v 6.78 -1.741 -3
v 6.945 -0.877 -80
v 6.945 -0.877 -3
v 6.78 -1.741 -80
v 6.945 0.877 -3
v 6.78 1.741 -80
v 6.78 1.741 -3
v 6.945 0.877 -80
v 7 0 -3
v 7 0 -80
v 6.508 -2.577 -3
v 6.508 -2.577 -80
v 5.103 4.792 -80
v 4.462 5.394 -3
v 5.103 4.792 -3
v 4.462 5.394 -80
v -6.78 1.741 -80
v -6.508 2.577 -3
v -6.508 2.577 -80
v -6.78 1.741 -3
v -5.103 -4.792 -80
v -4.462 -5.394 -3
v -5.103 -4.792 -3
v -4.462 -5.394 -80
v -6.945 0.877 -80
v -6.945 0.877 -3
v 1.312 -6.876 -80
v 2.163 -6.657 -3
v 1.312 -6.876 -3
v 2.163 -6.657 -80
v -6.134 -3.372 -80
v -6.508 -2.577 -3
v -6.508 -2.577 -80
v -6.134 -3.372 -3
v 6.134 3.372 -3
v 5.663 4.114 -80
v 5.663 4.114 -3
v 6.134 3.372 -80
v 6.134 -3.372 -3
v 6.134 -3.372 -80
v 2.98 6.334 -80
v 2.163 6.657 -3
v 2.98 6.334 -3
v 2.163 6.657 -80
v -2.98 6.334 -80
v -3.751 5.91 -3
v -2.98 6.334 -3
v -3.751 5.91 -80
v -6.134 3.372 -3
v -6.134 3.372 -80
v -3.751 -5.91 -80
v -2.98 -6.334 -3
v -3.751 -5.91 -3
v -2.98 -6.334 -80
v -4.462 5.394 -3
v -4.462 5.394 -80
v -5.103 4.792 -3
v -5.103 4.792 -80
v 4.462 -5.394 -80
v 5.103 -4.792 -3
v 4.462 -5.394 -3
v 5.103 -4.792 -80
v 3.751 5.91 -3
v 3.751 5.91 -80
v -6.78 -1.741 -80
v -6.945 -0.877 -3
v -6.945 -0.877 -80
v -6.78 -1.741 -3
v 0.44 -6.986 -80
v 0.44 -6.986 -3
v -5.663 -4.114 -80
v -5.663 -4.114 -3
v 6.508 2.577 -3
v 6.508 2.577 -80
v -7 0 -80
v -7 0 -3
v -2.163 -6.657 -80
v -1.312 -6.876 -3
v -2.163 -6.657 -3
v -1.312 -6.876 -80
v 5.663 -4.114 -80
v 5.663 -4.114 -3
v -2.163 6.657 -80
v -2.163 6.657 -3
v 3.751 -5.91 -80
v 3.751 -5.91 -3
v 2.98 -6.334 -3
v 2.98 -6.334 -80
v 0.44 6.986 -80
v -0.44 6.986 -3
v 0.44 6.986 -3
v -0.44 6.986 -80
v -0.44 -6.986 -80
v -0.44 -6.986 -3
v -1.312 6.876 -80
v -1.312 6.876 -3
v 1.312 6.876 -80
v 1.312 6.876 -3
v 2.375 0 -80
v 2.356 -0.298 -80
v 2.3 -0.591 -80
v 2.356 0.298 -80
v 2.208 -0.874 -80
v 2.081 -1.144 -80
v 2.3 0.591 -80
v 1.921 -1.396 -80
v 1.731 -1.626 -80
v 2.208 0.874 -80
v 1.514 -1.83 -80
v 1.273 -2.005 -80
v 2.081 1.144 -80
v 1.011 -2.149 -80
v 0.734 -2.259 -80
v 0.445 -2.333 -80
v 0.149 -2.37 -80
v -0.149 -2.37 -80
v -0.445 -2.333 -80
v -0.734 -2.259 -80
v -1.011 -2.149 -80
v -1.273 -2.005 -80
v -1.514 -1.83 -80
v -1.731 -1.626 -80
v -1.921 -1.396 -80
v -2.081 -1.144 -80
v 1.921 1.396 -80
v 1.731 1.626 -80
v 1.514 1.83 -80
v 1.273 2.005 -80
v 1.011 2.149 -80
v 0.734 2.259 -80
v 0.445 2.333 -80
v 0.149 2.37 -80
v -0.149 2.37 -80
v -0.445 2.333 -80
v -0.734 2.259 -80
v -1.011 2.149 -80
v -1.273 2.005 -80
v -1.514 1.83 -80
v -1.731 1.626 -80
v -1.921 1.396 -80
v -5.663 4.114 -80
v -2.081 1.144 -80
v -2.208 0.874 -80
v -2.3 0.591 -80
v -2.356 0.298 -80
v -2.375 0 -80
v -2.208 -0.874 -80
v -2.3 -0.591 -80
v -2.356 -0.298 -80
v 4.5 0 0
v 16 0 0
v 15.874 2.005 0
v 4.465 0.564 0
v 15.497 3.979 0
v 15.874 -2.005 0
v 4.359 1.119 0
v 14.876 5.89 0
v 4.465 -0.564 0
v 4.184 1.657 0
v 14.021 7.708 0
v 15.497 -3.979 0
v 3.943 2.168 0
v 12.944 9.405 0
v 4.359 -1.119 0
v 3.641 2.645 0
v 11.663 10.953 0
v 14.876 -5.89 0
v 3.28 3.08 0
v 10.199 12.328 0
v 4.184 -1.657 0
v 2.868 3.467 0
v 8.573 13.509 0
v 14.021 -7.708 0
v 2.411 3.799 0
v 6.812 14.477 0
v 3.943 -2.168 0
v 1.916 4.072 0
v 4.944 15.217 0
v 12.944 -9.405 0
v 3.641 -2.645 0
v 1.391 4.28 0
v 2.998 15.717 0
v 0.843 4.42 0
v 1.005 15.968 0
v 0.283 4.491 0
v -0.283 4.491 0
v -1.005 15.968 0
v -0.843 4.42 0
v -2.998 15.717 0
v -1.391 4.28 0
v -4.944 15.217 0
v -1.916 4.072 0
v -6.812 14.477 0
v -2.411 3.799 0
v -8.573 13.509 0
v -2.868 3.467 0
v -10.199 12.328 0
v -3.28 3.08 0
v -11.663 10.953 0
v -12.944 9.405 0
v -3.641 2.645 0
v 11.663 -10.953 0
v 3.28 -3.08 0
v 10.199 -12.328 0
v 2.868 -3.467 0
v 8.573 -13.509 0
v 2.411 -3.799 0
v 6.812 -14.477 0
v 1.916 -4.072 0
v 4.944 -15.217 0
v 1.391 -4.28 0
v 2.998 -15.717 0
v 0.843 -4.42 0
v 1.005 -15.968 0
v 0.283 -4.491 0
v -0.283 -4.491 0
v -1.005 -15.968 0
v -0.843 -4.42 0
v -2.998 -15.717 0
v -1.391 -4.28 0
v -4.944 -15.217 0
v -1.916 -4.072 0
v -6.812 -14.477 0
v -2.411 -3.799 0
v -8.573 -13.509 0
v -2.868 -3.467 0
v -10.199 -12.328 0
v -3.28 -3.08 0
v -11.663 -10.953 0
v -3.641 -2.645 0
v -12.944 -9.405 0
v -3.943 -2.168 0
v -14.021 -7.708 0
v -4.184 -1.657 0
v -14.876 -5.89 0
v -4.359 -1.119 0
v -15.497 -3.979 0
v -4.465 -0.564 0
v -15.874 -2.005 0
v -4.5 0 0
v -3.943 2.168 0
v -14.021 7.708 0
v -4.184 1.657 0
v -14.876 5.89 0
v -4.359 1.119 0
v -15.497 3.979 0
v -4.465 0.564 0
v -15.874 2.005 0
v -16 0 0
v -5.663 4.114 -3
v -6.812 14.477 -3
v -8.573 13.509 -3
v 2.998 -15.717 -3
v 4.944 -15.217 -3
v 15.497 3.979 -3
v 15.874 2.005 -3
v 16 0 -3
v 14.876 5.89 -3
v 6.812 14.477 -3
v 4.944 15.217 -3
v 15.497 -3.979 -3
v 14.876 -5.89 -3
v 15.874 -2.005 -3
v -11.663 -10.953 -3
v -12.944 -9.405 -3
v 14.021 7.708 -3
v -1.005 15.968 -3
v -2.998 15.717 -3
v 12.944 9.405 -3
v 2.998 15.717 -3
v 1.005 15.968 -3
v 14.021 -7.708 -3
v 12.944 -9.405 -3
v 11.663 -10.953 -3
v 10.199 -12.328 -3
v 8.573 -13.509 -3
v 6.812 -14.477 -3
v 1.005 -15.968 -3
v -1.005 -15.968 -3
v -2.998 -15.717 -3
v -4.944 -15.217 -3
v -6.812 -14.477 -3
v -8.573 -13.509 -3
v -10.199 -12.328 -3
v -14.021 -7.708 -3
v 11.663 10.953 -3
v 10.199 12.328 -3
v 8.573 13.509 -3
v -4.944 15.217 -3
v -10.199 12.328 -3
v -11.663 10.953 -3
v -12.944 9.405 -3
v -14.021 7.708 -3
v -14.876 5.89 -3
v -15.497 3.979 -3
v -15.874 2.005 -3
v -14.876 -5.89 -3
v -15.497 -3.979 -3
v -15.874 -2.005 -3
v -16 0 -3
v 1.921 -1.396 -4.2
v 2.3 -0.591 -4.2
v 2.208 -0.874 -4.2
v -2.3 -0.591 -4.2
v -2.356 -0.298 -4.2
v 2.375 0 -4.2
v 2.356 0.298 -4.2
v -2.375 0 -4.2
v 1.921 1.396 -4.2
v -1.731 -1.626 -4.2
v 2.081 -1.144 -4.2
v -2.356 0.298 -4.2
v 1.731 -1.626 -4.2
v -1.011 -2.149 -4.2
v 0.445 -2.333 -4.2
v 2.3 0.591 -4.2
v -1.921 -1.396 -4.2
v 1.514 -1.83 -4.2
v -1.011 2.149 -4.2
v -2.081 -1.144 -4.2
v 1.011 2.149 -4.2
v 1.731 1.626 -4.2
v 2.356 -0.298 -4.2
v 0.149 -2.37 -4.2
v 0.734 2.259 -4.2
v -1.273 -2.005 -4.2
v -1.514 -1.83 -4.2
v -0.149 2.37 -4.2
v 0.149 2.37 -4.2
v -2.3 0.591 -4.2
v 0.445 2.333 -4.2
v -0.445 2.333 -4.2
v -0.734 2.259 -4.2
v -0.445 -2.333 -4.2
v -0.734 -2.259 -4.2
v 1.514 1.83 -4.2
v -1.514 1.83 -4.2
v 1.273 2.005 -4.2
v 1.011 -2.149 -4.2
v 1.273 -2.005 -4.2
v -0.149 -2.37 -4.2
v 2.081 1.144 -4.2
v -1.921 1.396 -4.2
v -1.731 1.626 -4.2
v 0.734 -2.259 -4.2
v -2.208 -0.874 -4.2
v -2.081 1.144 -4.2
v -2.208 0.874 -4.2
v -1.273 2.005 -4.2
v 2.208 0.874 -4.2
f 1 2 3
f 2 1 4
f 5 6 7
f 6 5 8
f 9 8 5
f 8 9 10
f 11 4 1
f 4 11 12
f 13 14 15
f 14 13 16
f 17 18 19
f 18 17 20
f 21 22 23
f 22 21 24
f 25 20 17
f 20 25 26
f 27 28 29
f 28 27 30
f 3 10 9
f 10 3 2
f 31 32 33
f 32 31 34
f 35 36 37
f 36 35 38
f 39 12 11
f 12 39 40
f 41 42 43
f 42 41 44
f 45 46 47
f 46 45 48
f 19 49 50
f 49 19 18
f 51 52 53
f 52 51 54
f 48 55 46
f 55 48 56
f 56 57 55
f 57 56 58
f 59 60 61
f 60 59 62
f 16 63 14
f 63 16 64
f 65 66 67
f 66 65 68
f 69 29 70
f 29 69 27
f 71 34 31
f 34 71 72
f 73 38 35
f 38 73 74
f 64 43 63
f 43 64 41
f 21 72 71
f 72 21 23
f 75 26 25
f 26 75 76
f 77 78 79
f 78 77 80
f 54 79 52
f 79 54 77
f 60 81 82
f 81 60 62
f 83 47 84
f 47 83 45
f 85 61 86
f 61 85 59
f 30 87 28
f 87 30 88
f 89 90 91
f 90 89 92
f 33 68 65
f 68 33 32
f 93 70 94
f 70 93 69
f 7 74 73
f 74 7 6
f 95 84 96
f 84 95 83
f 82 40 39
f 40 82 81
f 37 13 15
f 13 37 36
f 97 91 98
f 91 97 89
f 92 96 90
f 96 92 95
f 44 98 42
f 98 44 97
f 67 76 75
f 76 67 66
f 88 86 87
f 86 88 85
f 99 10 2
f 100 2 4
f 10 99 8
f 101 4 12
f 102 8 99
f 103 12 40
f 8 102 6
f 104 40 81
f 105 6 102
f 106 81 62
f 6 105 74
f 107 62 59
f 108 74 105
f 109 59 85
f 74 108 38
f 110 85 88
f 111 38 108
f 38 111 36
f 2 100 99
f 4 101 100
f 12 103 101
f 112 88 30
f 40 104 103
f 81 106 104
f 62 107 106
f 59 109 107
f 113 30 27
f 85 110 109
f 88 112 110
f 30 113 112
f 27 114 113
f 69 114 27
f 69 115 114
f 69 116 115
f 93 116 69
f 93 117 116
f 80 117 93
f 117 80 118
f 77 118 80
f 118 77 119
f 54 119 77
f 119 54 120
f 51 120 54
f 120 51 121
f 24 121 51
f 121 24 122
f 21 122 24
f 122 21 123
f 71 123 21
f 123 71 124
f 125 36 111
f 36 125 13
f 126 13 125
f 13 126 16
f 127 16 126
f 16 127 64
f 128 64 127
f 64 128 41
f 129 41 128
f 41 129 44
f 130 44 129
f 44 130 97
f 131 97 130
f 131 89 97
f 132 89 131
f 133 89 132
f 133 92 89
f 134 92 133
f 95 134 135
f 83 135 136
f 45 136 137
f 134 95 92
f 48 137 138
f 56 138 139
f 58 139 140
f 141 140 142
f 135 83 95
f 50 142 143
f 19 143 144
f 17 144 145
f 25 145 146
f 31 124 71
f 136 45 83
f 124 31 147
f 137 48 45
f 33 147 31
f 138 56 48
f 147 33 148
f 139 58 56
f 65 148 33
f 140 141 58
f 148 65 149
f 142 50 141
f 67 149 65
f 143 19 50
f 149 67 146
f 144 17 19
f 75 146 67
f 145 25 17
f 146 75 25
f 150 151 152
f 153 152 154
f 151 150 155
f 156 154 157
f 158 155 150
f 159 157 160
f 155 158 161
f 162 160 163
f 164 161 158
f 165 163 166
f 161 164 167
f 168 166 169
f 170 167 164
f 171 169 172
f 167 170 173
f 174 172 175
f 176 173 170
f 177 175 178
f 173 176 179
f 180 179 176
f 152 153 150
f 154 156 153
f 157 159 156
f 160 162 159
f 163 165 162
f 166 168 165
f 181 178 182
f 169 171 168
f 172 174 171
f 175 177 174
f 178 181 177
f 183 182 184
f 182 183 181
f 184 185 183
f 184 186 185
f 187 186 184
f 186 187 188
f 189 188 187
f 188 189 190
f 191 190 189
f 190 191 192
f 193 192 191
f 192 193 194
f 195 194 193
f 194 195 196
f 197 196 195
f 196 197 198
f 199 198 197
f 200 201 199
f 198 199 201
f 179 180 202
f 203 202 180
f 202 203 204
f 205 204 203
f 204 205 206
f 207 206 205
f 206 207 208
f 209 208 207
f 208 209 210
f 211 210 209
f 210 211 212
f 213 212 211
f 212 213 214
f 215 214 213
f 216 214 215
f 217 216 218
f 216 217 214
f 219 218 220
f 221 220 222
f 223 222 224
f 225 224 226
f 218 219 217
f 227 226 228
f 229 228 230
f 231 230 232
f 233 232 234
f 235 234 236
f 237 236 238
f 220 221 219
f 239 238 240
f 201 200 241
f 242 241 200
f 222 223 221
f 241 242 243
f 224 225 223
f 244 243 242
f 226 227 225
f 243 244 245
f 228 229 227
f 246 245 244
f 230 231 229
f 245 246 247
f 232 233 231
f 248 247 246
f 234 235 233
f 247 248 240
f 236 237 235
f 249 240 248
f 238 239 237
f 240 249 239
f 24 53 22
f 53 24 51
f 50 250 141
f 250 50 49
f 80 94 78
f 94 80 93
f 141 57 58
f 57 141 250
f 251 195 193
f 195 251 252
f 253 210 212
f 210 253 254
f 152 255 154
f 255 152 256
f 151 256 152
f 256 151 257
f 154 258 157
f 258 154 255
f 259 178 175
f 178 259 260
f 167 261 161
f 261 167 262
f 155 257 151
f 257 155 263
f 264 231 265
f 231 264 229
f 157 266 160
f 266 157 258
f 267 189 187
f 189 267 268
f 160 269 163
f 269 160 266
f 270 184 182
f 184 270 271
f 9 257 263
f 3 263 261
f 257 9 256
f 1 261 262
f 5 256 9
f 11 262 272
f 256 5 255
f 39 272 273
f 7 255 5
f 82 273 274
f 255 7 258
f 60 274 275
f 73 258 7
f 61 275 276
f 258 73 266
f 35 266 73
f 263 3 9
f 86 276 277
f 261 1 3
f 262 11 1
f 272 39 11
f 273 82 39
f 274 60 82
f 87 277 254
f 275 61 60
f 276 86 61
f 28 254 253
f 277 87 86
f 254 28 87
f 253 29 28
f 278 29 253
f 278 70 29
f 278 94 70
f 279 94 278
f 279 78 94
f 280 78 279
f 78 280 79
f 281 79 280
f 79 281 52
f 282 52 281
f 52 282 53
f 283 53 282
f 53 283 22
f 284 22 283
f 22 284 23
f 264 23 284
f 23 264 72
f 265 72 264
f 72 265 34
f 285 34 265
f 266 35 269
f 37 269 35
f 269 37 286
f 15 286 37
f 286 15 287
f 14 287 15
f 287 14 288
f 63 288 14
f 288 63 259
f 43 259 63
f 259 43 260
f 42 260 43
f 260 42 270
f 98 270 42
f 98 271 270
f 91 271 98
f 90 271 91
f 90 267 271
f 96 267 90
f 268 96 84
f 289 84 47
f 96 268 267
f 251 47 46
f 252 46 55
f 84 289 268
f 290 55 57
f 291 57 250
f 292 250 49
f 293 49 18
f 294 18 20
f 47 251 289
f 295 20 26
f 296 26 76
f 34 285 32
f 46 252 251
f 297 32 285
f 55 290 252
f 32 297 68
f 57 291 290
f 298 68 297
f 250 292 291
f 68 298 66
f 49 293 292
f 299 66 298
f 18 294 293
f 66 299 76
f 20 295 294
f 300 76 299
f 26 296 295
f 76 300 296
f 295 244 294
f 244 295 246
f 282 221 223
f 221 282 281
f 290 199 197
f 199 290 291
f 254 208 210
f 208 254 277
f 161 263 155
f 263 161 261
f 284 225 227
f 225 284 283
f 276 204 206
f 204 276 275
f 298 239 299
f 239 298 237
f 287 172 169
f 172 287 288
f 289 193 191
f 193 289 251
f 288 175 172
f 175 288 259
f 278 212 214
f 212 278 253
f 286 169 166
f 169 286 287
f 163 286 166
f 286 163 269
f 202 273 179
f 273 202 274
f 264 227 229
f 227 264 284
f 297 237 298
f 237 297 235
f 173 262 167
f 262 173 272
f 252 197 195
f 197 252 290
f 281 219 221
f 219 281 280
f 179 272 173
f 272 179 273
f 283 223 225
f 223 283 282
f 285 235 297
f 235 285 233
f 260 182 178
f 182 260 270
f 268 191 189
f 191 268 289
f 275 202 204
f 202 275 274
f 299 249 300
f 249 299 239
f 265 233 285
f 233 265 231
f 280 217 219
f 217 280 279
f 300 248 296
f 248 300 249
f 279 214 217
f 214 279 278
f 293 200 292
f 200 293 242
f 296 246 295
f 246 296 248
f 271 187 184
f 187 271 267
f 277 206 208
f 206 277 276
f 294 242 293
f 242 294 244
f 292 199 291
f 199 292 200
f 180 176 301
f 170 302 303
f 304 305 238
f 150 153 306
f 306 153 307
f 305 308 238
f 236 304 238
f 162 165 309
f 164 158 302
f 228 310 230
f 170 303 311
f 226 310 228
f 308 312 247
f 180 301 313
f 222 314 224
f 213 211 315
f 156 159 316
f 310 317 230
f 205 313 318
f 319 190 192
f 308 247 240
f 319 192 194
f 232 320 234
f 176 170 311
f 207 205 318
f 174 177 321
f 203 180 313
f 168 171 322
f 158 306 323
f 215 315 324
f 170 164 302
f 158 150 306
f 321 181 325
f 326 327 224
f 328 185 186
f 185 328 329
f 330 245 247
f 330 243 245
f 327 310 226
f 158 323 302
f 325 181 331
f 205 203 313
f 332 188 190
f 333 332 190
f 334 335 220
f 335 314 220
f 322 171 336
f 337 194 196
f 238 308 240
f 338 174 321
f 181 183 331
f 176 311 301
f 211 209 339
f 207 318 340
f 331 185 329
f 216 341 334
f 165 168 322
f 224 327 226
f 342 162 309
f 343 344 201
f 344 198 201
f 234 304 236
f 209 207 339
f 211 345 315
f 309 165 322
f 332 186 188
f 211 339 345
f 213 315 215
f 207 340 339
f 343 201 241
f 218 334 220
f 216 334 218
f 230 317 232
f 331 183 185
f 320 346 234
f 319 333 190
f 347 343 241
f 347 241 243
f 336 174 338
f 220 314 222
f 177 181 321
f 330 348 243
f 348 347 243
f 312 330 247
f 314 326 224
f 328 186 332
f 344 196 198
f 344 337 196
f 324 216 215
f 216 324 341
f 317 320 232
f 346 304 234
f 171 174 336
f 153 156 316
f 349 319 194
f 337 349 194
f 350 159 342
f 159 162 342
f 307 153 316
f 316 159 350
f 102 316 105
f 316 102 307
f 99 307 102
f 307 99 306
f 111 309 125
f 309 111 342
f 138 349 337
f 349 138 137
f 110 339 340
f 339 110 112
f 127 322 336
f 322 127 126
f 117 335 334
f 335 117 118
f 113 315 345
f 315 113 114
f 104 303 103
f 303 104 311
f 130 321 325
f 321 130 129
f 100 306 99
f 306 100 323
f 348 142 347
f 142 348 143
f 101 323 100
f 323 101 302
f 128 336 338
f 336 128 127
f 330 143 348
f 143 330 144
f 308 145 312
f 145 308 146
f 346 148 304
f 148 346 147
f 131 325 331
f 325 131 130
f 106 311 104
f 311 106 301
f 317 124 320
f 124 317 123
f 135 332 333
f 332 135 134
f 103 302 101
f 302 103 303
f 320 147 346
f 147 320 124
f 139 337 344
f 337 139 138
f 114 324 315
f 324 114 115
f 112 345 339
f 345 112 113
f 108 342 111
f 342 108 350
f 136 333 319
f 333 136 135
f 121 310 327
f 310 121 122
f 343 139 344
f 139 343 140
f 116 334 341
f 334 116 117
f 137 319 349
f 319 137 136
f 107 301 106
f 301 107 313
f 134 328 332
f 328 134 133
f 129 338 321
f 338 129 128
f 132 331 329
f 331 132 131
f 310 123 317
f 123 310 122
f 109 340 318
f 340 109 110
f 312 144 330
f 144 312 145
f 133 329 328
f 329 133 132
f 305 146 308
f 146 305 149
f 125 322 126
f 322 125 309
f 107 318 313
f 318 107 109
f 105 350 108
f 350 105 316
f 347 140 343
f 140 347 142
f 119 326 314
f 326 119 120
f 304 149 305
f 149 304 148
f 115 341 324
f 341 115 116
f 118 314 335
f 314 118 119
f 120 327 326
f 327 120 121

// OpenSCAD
$fn = 50;


difference() {
	union() {
		translate(v = [0, 0, -80.0000000000]) {
			cylinder(h = 80, r = 7.0000000000);
		}
		translate(v = [0, 0, -3.0000000000]) {
			cylinder(h = 3, r = 16.0000000000);
		}
	}
	union() {
		translate(v = [0, 0, 0]) {
			rotate(a = [0, 0, 0]) {
				difference() {
					union() {
						#translate(v = [0, 0, -80.0000000000]) {
							cylinder(h = 80, r = 2.2500000000);
						}
						#translate(v = [0, 0, -4.2000000000]) {
							cylinder(h = 4.2000000000, r = 7.0000000000, r1 = 2.3750000000, r2 = 4.5000000000);
						}
						#translate(v = [0, 0, -80.0000000000]) {
							cylinder(h = 80, r = 2.3750000000);
						}
						#translate(v = [0, 0, -80.0000000000]) {
							cylinder(h = 80, r = 2.2500000000);
						}
					}
					union();
				}
			}
		}
	}
}
